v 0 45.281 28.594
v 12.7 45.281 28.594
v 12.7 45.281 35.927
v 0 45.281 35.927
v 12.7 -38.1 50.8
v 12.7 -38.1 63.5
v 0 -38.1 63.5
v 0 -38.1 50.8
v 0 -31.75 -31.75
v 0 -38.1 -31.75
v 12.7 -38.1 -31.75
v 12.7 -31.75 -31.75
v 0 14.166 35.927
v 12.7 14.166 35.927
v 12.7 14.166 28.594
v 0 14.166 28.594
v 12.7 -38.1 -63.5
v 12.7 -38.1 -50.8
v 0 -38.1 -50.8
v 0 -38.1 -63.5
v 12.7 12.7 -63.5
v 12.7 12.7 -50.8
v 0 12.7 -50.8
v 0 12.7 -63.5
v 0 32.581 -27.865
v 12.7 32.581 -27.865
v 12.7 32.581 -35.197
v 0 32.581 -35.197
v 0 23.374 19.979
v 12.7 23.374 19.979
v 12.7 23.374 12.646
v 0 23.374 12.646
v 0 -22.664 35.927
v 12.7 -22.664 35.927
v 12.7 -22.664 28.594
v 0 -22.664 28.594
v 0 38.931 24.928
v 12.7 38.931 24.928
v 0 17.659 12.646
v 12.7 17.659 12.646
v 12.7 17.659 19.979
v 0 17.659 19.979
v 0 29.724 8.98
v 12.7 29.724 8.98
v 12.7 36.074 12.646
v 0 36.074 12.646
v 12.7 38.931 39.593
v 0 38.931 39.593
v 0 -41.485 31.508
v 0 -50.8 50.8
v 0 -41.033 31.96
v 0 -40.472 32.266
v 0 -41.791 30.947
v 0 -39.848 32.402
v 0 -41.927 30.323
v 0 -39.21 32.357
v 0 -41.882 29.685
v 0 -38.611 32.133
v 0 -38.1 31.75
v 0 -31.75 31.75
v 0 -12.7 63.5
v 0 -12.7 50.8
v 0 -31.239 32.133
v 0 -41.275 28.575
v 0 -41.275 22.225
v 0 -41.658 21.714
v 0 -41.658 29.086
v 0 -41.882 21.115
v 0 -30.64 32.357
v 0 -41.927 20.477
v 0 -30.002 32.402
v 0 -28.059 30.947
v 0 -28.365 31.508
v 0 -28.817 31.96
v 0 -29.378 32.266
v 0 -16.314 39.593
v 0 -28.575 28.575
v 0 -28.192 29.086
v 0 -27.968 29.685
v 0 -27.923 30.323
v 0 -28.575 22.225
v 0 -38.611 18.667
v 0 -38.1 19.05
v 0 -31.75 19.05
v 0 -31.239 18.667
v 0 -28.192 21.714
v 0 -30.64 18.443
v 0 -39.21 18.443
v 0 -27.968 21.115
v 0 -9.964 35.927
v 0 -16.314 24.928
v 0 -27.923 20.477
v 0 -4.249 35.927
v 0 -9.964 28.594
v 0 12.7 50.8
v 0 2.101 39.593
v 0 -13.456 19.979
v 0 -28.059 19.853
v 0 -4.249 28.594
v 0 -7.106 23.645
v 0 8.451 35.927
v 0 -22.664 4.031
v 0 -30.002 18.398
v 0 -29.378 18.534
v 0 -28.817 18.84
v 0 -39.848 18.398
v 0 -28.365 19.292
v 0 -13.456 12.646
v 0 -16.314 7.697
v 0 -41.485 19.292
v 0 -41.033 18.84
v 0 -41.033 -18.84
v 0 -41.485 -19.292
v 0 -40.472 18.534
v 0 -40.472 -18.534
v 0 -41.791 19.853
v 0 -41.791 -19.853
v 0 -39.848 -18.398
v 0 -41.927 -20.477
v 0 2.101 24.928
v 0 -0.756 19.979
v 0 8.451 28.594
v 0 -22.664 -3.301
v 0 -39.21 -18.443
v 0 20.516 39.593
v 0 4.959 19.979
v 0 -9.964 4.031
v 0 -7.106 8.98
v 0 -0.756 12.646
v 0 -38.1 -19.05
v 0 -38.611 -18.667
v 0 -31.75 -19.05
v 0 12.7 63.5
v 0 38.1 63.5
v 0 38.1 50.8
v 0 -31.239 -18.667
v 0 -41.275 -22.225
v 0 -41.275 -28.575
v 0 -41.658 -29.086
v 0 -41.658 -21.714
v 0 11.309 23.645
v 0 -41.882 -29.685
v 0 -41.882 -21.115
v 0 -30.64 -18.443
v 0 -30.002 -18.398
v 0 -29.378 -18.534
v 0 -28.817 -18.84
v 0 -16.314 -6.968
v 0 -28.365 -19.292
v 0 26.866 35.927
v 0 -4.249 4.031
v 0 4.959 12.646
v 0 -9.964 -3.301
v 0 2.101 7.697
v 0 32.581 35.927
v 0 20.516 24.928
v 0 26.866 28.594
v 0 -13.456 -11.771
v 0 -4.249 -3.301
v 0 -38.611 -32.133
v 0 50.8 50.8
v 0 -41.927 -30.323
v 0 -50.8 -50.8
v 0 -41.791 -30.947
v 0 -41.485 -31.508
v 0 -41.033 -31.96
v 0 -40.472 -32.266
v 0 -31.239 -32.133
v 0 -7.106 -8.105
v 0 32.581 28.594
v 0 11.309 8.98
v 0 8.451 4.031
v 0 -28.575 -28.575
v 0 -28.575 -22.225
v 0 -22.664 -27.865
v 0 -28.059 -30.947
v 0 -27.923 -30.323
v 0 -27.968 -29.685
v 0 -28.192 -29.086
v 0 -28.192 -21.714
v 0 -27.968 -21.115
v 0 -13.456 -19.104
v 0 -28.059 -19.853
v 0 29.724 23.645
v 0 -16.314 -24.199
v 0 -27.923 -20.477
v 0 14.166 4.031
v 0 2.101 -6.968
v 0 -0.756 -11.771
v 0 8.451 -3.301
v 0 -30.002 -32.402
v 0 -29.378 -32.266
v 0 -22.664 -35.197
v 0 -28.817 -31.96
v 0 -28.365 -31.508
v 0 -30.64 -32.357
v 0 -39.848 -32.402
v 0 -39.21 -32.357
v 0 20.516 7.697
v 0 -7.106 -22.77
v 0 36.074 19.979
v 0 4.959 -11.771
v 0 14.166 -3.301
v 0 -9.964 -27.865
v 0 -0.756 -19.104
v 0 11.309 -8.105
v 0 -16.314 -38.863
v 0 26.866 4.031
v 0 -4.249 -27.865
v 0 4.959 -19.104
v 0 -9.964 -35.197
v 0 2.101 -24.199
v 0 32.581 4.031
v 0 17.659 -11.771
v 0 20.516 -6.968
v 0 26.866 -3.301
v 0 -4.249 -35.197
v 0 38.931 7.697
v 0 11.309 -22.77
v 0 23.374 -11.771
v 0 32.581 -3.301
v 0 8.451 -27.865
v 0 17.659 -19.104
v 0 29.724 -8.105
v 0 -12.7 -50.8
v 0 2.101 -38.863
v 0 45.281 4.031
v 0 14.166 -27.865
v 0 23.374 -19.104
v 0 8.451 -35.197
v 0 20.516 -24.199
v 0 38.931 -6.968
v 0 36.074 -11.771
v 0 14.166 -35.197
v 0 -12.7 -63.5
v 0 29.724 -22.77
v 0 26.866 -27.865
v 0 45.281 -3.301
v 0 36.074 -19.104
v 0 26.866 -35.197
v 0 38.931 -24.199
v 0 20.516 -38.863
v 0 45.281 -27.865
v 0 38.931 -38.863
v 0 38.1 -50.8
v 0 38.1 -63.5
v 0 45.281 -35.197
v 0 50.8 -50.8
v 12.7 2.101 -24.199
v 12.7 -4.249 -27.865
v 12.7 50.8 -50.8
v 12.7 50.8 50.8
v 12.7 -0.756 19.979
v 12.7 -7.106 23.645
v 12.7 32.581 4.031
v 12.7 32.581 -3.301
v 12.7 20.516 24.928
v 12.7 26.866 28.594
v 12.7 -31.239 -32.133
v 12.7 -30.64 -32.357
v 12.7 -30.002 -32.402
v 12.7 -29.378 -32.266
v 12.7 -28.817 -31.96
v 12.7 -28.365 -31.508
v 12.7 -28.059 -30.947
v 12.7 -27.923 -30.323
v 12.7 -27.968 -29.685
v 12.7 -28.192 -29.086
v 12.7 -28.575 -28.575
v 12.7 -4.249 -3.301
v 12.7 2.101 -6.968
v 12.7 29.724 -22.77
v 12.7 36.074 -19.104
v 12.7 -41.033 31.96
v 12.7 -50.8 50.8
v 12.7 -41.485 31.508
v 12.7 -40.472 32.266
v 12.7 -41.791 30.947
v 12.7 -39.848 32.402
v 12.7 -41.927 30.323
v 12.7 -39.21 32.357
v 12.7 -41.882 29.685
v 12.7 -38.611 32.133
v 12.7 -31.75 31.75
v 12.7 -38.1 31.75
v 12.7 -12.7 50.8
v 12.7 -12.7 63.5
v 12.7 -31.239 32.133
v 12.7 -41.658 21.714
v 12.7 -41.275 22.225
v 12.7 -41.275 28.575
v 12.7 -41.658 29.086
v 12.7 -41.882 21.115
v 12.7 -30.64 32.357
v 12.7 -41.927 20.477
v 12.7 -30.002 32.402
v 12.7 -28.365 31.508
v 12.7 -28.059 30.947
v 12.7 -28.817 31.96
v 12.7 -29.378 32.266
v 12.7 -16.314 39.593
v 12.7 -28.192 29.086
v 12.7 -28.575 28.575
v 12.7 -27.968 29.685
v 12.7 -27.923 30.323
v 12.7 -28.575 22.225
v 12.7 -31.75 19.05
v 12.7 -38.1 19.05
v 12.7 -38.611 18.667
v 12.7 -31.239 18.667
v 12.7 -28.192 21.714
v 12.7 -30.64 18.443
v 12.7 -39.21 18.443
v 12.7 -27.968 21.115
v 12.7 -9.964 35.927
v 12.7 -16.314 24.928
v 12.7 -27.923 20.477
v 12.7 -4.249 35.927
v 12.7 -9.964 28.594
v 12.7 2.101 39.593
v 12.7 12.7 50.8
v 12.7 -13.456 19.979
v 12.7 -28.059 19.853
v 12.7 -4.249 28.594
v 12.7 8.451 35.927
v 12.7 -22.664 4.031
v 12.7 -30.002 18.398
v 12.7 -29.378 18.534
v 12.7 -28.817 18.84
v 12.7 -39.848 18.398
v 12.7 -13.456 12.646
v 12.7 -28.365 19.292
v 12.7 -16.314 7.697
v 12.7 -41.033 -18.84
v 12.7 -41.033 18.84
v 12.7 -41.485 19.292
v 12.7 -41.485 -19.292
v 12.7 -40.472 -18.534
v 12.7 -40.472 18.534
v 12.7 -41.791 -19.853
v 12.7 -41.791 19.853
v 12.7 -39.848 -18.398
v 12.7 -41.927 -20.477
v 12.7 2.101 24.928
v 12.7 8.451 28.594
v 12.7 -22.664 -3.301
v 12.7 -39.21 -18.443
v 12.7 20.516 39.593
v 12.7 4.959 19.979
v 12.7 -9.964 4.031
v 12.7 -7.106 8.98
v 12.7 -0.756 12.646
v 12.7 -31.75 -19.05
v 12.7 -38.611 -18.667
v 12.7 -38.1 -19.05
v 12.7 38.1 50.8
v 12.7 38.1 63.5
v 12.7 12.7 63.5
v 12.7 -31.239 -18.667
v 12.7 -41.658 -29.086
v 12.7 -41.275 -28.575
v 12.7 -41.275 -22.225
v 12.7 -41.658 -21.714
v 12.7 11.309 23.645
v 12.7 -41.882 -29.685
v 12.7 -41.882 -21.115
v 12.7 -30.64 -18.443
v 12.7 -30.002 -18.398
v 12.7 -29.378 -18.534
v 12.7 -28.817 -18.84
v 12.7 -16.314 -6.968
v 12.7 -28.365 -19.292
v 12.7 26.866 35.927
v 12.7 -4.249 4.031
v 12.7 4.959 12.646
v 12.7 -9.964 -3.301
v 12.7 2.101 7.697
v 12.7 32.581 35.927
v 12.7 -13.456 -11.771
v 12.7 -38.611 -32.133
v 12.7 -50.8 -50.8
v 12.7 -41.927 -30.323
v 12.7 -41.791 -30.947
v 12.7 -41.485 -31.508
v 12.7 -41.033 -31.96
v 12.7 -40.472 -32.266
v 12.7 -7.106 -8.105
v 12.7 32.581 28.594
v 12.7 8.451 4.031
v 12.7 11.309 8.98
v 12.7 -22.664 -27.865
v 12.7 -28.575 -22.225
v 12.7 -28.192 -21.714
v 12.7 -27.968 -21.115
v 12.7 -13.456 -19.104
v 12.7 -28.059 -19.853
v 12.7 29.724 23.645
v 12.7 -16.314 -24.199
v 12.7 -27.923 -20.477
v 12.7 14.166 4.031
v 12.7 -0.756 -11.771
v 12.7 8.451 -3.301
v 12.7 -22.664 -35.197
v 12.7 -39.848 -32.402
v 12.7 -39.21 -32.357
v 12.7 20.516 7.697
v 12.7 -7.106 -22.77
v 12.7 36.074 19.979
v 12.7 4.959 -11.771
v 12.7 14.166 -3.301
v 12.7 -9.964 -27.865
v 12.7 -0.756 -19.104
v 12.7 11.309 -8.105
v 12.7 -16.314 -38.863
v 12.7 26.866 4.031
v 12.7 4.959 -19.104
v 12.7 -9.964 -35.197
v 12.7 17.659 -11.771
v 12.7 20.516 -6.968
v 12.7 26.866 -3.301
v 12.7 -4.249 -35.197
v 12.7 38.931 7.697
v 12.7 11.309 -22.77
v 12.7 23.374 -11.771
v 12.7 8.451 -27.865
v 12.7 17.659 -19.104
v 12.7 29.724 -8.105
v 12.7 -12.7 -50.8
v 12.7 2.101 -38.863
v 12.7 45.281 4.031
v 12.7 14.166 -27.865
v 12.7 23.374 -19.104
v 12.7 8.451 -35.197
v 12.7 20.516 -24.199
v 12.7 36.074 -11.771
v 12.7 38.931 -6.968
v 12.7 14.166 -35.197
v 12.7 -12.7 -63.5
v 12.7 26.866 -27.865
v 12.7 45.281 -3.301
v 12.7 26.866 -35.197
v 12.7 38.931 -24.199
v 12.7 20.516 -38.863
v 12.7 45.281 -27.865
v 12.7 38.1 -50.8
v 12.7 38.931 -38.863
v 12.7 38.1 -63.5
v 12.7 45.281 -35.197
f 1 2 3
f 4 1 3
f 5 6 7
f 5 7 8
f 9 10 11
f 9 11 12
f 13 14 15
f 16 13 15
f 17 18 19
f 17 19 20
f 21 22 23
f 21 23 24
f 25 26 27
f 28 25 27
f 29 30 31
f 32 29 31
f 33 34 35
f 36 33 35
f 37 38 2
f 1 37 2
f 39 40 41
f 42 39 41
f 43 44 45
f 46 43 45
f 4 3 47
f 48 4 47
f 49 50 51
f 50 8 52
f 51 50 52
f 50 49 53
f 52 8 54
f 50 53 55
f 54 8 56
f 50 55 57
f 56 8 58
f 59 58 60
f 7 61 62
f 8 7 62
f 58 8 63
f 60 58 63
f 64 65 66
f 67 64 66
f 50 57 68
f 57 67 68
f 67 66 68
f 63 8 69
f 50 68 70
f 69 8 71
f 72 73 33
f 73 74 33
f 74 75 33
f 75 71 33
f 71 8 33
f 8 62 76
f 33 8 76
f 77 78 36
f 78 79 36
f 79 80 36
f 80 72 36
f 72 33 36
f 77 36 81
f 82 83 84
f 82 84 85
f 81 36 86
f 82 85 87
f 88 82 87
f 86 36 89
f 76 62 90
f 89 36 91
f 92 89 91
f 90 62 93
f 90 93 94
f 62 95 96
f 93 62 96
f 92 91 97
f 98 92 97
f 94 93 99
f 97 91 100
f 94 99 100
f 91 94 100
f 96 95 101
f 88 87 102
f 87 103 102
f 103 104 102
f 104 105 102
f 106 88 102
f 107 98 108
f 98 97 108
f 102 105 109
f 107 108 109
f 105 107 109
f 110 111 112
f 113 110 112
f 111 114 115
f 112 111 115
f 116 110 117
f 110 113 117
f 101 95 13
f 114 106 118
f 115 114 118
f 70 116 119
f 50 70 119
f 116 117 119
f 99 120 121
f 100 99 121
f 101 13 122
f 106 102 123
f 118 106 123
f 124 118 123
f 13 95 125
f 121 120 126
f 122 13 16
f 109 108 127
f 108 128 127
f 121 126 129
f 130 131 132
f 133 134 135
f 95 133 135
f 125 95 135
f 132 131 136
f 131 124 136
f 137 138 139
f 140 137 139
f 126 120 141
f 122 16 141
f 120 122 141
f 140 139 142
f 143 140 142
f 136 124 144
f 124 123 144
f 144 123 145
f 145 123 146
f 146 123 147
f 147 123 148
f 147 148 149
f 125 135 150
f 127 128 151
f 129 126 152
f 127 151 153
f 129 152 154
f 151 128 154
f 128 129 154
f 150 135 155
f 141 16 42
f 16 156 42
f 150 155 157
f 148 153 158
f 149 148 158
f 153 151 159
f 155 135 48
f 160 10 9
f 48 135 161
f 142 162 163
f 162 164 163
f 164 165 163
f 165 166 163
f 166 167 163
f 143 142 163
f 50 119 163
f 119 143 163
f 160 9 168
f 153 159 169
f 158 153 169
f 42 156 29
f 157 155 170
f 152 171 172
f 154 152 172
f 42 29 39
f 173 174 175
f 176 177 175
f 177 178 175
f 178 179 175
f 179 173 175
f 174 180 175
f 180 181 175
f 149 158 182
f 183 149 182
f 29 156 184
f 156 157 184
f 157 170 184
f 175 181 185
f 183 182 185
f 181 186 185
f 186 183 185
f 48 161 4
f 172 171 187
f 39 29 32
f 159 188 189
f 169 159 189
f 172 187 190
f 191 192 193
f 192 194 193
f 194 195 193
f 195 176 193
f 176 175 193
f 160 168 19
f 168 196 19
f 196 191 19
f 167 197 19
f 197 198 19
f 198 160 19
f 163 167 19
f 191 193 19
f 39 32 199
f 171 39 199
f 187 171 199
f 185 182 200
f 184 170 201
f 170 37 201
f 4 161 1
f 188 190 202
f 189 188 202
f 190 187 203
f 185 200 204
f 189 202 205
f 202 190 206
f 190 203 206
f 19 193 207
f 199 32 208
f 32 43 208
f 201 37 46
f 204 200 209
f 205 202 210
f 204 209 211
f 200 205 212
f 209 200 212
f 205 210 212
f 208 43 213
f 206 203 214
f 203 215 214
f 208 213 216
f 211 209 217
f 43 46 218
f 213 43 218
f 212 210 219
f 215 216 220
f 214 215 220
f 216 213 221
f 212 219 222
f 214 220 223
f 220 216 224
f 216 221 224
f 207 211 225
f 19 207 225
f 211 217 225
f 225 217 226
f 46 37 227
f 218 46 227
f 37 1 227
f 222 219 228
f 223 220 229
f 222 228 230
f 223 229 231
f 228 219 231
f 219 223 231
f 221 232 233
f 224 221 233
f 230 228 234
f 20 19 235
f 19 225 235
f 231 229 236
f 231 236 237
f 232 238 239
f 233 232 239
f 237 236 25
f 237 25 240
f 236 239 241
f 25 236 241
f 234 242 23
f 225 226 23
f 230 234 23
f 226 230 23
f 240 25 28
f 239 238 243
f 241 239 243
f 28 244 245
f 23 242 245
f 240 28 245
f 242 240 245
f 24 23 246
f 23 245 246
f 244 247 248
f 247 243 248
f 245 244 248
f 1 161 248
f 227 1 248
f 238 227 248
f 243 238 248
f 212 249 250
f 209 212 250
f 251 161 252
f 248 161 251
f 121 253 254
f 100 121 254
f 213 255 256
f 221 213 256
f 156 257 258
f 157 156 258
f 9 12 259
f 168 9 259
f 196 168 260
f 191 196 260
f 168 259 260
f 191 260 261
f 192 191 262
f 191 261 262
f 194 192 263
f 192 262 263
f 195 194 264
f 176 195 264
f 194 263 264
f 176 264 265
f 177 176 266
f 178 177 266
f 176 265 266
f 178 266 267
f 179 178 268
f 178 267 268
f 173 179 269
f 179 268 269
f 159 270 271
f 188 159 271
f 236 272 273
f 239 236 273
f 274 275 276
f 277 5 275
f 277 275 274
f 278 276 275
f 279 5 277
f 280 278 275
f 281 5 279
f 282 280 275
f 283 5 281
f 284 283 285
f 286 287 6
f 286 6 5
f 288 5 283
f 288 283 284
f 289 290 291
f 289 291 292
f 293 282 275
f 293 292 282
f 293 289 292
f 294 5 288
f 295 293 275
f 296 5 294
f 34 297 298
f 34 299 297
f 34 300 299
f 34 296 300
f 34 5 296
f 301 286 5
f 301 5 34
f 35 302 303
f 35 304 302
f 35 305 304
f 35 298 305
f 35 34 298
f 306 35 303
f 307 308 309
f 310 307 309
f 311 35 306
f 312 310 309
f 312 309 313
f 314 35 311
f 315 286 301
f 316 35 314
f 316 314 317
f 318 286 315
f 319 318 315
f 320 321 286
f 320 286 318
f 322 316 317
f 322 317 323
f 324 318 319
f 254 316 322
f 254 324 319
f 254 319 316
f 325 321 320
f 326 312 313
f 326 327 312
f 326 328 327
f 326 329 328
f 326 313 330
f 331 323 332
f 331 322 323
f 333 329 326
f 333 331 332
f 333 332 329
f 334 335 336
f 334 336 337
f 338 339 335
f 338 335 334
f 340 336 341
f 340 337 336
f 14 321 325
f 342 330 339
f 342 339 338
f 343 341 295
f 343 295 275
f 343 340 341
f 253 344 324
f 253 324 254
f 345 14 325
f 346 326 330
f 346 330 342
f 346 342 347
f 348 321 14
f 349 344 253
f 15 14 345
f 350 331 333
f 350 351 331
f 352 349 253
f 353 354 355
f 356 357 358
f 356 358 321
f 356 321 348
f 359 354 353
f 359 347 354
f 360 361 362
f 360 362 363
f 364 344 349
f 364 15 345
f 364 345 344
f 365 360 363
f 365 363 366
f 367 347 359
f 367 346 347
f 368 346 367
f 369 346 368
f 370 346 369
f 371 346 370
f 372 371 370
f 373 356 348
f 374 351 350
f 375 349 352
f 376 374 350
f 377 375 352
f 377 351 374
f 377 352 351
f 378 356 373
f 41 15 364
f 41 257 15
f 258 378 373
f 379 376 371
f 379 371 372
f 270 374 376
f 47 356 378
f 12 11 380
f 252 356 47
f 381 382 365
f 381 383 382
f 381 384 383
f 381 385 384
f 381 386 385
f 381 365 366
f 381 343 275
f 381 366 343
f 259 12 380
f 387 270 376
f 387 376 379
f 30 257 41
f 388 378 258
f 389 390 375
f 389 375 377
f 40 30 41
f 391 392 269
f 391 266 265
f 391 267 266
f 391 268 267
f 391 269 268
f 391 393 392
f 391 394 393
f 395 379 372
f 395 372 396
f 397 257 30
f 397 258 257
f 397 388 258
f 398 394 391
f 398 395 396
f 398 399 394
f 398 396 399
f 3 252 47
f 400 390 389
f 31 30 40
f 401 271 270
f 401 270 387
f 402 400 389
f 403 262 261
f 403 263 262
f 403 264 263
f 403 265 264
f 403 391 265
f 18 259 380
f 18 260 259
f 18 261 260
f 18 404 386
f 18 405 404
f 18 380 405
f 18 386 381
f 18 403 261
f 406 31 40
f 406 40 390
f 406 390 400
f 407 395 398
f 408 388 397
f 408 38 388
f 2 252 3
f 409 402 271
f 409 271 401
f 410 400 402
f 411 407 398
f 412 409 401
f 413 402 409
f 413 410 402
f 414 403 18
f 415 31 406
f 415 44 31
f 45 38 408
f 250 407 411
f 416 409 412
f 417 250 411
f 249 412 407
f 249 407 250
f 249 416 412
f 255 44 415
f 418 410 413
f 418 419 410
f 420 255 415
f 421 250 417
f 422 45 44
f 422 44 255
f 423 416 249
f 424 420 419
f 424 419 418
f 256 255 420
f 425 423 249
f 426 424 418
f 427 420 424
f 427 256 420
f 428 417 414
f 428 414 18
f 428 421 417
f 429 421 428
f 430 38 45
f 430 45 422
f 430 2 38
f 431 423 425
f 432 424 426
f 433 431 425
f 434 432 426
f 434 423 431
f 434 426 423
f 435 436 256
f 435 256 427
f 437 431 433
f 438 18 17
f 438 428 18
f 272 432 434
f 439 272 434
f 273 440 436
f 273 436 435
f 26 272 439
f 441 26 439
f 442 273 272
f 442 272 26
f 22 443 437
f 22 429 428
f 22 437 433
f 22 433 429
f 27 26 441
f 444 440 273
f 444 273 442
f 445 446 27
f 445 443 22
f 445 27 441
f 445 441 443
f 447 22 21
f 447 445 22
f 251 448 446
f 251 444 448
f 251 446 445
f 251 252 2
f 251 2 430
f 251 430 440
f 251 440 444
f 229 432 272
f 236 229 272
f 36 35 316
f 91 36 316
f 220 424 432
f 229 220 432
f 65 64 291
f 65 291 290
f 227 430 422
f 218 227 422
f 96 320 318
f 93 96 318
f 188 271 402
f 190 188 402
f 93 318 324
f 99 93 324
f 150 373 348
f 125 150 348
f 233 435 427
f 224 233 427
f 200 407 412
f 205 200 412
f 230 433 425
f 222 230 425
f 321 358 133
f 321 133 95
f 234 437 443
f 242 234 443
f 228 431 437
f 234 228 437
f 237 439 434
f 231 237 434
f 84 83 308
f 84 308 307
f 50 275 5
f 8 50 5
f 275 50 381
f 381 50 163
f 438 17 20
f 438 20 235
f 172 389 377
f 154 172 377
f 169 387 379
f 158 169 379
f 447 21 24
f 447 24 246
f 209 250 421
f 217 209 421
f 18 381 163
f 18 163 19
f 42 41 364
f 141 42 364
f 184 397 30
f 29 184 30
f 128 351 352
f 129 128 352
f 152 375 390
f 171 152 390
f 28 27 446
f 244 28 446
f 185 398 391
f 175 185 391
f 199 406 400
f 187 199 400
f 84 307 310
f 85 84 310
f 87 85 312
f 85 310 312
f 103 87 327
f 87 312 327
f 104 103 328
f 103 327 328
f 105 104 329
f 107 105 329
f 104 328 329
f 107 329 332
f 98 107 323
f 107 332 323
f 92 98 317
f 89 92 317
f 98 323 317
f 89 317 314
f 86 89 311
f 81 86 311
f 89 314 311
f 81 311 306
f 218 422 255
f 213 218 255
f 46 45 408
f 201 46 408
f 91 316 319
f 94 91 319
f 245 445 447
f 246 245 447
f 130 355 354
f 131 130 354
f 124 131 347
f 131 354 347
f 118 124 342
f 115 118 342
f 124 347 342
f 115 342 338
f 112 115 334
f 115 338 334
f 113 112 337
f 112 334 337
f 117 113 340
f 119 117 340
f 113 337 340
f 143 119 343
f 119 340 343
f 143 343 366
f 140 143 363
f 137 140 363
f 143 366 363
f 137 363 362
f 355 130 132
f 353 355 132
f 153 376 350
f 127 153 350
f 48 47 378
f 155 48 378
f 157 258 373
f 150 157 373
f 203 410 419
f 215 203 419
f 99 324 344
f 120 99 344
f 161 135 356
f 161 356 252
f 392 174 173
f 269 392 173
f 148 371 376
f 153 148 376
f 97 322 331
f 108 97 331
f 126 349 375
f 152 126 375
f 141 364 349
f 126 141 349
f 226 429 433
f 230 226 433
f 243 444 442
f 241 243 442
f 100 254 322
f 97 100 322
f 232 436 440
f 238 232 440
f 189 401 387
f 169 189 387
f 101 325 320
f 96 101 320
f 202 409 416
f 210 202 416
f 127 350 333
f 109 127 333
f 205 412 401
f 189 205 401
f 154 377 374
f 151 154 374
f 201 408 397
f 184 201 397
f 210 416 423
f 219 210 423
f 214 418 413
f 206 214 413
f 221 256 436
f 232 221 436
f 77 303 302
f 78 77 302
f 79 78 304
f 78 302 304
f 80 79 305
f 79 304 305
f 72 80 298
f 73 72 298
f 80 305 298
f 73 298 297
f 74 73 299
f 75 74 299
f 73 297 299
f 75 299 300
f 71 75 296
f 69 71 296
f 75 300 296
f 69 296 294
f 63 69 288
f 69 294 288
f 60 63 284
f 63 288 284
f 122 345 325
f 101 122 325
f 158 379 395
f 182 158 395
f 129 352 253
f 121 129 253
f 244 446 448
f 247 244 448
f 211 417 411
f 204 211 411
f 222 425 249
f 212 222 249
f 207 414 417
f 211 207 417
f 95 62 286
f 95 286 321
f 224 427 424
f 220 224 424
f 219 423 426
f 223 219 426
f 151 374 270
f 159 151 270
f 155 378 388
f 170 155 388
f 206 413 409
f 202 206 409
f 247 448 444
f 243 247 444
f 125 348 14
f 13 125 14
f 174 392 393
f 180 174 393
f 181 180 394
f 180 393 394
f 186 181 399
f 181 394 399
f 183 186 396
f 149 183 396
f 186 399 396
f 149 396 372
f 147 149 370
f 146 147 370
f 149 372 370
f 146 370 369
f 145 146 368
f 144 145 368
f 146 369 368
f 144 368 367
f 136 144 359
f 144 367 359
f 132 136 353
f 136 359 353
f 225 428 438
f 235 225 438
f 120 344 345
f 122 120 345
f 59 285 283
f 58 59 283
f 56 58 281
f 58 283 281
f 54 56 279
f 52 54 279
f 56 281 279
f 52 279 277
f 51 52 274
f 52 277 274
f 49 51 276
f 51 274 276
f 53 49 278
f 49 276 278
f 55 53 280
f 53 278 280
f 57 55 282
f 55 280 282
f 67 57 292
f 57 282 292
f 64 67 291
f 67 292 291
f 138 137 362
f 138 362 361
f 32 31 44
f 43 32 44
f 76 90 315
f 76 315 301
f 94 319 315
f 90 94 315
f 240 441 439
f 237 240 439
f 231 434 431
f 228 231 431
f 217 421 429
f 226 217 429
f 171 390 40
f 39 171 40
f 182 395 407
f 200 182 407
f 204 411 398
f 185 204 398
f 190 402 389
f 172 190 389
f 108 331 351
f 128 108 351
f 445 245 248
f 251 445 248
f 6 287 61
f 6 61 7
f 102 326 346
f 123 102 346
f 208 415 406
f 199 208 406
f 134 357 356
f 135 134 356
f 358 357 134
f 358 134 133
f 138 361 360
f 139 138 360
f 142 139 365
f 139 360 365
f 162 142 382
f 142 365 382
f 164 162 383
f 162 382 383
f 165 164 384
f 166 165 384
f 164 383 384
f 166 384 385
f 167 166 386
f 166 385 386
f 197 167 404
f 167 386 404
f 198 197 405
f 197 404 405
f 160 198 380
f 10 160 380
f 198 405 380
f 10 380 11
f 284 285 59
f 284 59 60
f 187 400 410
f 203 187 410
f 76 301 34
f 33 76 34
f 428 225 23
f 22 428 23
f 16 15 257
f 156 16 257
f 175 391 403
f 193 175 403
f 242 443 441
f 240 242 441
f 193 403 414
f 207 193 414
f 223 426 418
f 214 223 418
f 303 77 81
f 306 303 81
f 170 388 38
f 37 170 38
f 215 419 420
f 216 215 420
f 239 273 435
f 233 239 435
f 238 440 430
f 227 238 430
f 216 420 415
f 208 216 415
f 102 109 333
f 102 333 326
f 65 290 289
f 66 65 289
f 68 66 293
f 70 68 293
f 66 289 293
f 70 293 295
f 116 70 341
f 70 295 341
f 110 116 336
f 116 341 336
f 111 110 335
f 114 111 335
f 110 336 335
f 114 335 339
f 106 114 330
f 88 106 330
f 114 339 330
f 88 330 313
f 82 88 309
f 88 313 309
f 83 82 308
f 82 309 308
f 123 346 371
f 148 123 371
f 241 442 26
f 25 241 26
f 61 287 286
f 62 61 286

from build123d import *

# Parameters (mm, degrees)
SKETCH3_W                 = 101.6
SKETCH3_H                 = 101.6
SQUARE_EXTRUSION_DEPTH    = 12.7
SKETCH4_R                 = 2.24536
SKETCH4_W                 = 12.7
SKETCH4_H                 = 12.7
SLOTTING_HOLES_DEPTH      = 12.7
HONEYCOMB_POCKETING_DEPTH = 12.7
SKETCH10_W                = 12.7
SKETCH10_H                = 12.7
SIDE_SLOTS_DEPTH          = 12.7


with BuildPart() as part:
    # Sketch3 → Square Extrusion (new body)
    with BuildSketch(Plane(origin=(0, 0, 0), x_dir=(0, 0, -1), z_dir=(1, 0, 0))):
        Rectangle(SKETCH3_W, SKETCH3_H)
    extrude(amount=SQUARE_EXTRUSION_DEPTH)

    # Sketch4 → Slotting Holes (cut)
    with BuildSketch(Plane(origin=(12.7, 0, 0), x_dir=(0, 0, -1), z_dir=(1, 0, 0))):
        with BuildLine():
            ThreePointArc((-28.574581463, -28.575), (-31.750209282, -28.574790718), (-31.75, -31.750418537))
            Line((-31.75, -31.750418537), (-31.75, -28.575))
            Line((-31.75, -28.575), (-28.574581463, -28.575))
        make_face()
        with BuildLine():
            Line((-31.75, -28.575), (-31.75, -31.750418537))
            ThreePointArc((-31.75, -31.750418537), (-29.303101219, -32.236885515), (-27.91714, -30.1625))
            ThreePointArc((-27.91714, -30.1625), (-28.08800123, -29.303374641), (-28.574581463, -28.575))
            Line((-28.574581463, -28.575), (-31.75, -28.575))
        make_face()
        with Locations((-30.1625, -39.6875)):
            Circle(SKETCH4_R)
        with Locations((-20.6375, -39.6875)):
            Circle(SKETCH4_R)
        with Locations((-20.6375, -30.1625)):
            Circle(SKETCH4_R)
        with Locations((-30.1625, -30.1625)):
            Circle(SKETCH4_R)
        with Locations((-25.4, -34.925)):
            Rectangle(SKETCH4_W, SKETCH4_H)
        with BuildLine():
            ThreePointArc((-22.225418537, -28.575), (-22.225209282, -31.750209282), (-19.05, -31.750418537))
            Line((-19.05, -31.750418537), (-19.05, -28.575))
            Line((-19.05, -28.575), (-22.225418537, -28.575))
        make_face()
        with BuildLine():
            Line((-19.05, -28.575), (-19.05, -31.750418537))
            ThreePointArc((-19.05, -31.750418537), (-18.563114485, -31.021898781), (-18.39214, -30.1625))
            ThreePointArc((-18.39214, -30.1625), (-19.778374641, -28.08800123), (-22.225418537, -28.575))
            Line((-22.225418537, -28.575), (-19.05, -28.575))
        make_face()
        with BuildLine():
            Line((-31.75, -38.099581463), (-31.75, -41.275))
            Line((-31.75, -41.275), (-28.574581463, -41.275))
            ThreePointArc((-28.574581463, -41.275), (-28.08800123, -40.546625359), (-27.91714, -39.6875))
            ThreePointArc((-27.91714, -39.6875), (-29.303101219, -37.613114485), (-31.75, -38.099581463))
        make_face()
        with BuildLine():
            Line((-28.574581463, -41.275), (-31.75, -41.275))
            Line((-31.75, -41.275), (-31.75, -38.099581463))
            ThreePointArc((-31.75, -38.099581463), (-31.750209282, -41.275209282), (-28.574581463, -41.275))
        make_face()
        with BuildLine():
            ThreePointArc((-19.05, -38.099581463), (-22.225209282, -38.099790718), (-22.225418537, -41.275))
            Line((-22.225418537, -41.275), (-19.05, -41.275))
            Line((-19.05, -41.275), (-19.05, -38.099581463))
        make_face()
        with BuildLine():
            Line((-19.05, -41.275), (-22.225418537, -41.275))
            ThreePointArc((-22.225418537, -41.275), (-19.778374641, -41.76199877), (-18.39214, -39.6875))
            ThreePointArc((-18.39214, -39.6875), (-18.563114485, -38.828101219), (-19.05, -38.099581463))
            Line((-19.05, -38.099581463), (-19.05, -41.275))
        make_face()
        with BuildLine():
            ThreePointArc((22.88286, -30.1625), (22.71199877, -29.303374641), (22.225418537, -28.575))
            Line((22.225418537, -28.575), (19.05, -28.575))
            Line((19.05, -28.575), (19.05, -31.750418537))
            ThreePointArc((19.05, -31.750418537), (21.496898781, -32.236885515), (22.88286, -30.1625))
        make_face()
        with BuildLine():
            Line((19.05, -28.575), (22.225418537, -28.575))
            ThreePointArc((22.225418537, -28.575), (19.049790718, -28.574790718), (19.05, -31.750418537))
            Line((19.05, -31.750418537), (19.05, -28.575))
        make_face()
        with Locations((30.1625, -30.1625)):
            Circle(SKETCH4_R)
        with Locations((20.6375, -30.1625)):
            Circle(SKETCH4_R)
        with Locations((20.6375, -39.6875)):
            Circle(SKETCH4_R)
        with Locations((30.1625, -39.6875)):
            Circle(SKETCH4_R)
        with Locations((25.4, -34.925)):
            Rectangle(SKETCH4_W, SKETCH4_H)
        with BuildLine():
            Line((31.75, -31.750418537), (31.75, -28.575))
            Line((31.75, -28.575), (28.574581463, -28.575))
            ThreePointArc((28.574581463, -28.575), (28.574790718, -31.750209282), (31.75, -31.750418537))
        make_face()
        with BuildLine():
            Line((28.574581463, -28.575), (31.75, -28.575))
            Line((31.75, -28.575), (31.75, -31.750418537))
            ThreePointArc((31.75, -31.750418537), (32.236885515, -31.021898781), (32.40786, -30.1625))
            ThreePointArc((32.40786, -30.1625), (31.021625359, -28.08800123), (28.574581463, -28.575))
        make_face()
        with BuildLine():
            ThreePointArc((32.40786, -39.6875), (32.236885515, -38.828101219), (31.75, -38.099581463))
            Line((31.75, -38.099581463), (31.75, -41.275))
            Line((31.75, -41.275), (28.574581463, -41.275))
            ThreePointArc((28.574581463, -41.275), (31.021625359, -41.76199877), (32.40786, -39.6875))
        make_face()
        with BuildLine():
            Line((31.75, -41.275), (31.75, -38.099581463))
            ThreePointArc((31.75, -38.099581463), (28.574790718, -38.099790718), (28.574581463, -41.275))
            Line((28.574581463, -41.275), (31.75, -41.275))
        make_face()
        with BuildLine():
            ThreePointArc((22.88286, -39.6875), (21.496898781, -37.613114485), (19.05, -38.099581463))
            Line((19.05, -38.099581463), (19.05, -41.275))
            Line((19.05, -41.275), (22.225418537, -41.275))
            ThreePointArc((22.225418537, -41.275), (22.71199877, -40.546625359), (22.88286, -39.6875))
        make_face()
        with BuildLine():
            Line((19.05, -41.275), (19.05, -38.099581463))
            ThreePointArc((19.05, -38.099581463), (19.049790718, -41.275209282), (22.225418537, -41.275))
            Line((22.225418537, -41.275), (19.05, -41.275))
        make_face()
    extrude(amount=-SLOTTING_HOLES_DEPTH, mode=Mode.SUBTRACT)

    # Sketch9 → Honeycomb Pocketing (cut)
    with BuildSketch(Plane(origin=(12.7, 0, 0), x_dir=(0, 0, -1), z_dir=(1, 0, 0))):
        Polygon((6.96765294, 38.931186014), (3.301476978, 45.281185003), (-4.03087144, 45.28118298), (-7.697043898, 38.931181968), (-4.030867936, 32.58118298), (3.301480483, 32.581185003), align=None)
        Polygon((-24.928062682, 38.931186014), (-28.594238643, 45.281185003), (-35.926587062, 45.28118298), (-39.592759519, 38.931181968), (-35.926583558, 32.58118298), (-28.594235139, 32.581185003), align=None)
        Polygon((38.863368561, 38.931186014), (35.1971926, 45.281185003), (27.864844181, 45.28118298), (24.198671724, 38.931181968), (27.864847685, 32.58118298), (35.197196104, 32.581185003), align=None)
        Polygon((-8.980204871, 29.723686014), (-12.646380832, 36.073685003), (-19.978729251, 36.07368298), (-23.644901708, 29.723681968), (-19.978725747, 23.37368298), (-12.646377328, 23.373685003), align=None)
        Polygon((22.769795129, 29.723686014), (19.103619168, 36.073685003), (11.771270749, 36.07368298), (8.105098292, 29.723681968), (11.771274253, 23.37368298), (19.103622672, 23.373685003), align=None)
        Polygon((-24.928062682, 20.516186014), (-28.594238643, 26.866185003), (-35.926587062, 26.86618298), (-39.592759519, 20.516181968), (-35.926583558, 14.16618298), (-28.594235139, 14.166185003), align=None)
        Polygon((6.96765294, 20.516186014), (3.301476978, 26.866185003), (-4.03087144, 26.86618298), (-7.697043898, 20.516181968), (-4.030867936, 14.16618298), (3.301480483, 14.166185003), align=None)
        Polygon((38.863368561, 20.516186014), (35.1971926, 26.866185003), (27.864844181, 26.86618298), (24.198671724, 20.516181968), (27.864847685, 14.16618298), (35.197196104, 14.166185003), align=None)
        Polygon((-24.928062682, 2.101186014), (-28.594238643, 8.451185003), (-35.926587062, 8.45118298), (-39.592759519, 2.101181968), (-35.926583558, -4.24881702), (-28.594235139, -4.248814997), align=None)
        Polygon((-8.980204871, -7.106313986), (-12.646380832, -0.756314997), (-19.978729251, -0.75631702), (-23.644901708, -7.106318032), (-19.978725747, -13.45631702), (-12.646377328, -13.456314997), align=None)
        Polygon((6.96765294, 2.101186014), (3.301476978, 8.451185003), (-4.03087144, 8.45118298), (-7.697043898, 2.101181968), (-4.030867936, -4.24881702), (3.301480483, -4.248814997), align=None)
        Polygon((22.769795129, -7.106313986), (19.103619168, -0.756314997), (11.771270749, -0.75631702), (8.105098292, -7.106318032), (11.771274253, -13.45631702), (19.103622672, -13.456314997), align=None)
        Polygon((38.863368561, 2.101186014), (35.1971926, 8.451185003), (27.864844181, 8.45118298), (24.198671724, 2.101181968), (27.864847685, -4.24881702), (35.197196104, -4.248814997), align=None)
        Polygon((38.863368561, -16.313813986), (35.1971926, -9.963814997), (27.864844181, -9.96381702), (24.198671724, -16.313818032), (27.864847685, -22.66381702), (35.197196104, -22.663814997), align=None)
        Polygon((6.96765294, -16.313813986), (3.301476978, -9.963814997), (-4.03087144, -9.96381702), (-7.697043898, -16.313818032), (-4.030867936, -22.66381702), (3.301480483, -22.663814997), align=None)
        Polygon((-24.928062682, -16.313813986), (-28.594238643, -9.963814997), (-35.926587062, -9.96381702), (-39.592759519, -16.313818032), (-35.926583558, -22.66381702), (-28.594235139, -22.663814997), align=None)
        Polygon((22.769795129, 11.308686014), (19.103619168, 17.658685003), (11.771270749, 17.65868298), (8.105098292, 11.308681968), (11.771274253, 4.95868298), (19.103622672, 4.958685003), align=None)
        Polygon((-8.980204871, 11.308686014), (-12.646380832, 17.658685003), (-19.978729251, 17.65868298), (-23.644901708, 11.308681968), (-19.978725747, 4.95868298), (-12.646377328, 4.958685003), align=None)
    extrude(amount=-HONEYCOMB_POCKETING_DEPTH, mode=Mode.SUBTRACT)

    # Sketch10 → Side Slots (add)
    with BuildSketch(Plane(origin=(12.7, 0, 0), x_dir=(0, 0, -1), z_dir=(1, 0, 0))):
        with Locations((-57.15, 31.75)):
            Rectangle(SKETCH10_W, SKETCH10_H)
        with Locations((-57.15, 19.05)):
            Rectangle(SKETCH10_W, SKETCH10_H)
        with Locations((-57.15, -19.05)):
            Rectangle(SKETCH10_W, SKETCH10_H)
        with Locations((-57.15, -31.75)):
            Rectangle(SKETCH10_W, SKETCH10_H)
        with Locations((57.15, -19.05)):
            Rectangle(SKETCH10_W, SKETCH10_H)
        with Locations((57.15, -31.75)):
            Rectangle(SKETCH10_W, SKETCH10_H)
        with Locations((57.15, 19.05)):
            Rectangle(SKETCH10_W, SKETCH10_H)
        with Locations((57.15, 31.75)):
            Rectangle(SKETCH10_W, SKETCH10_H)
    extrude(amount=-SIDE_SLOTS_DEPTH)


solid = part.part
